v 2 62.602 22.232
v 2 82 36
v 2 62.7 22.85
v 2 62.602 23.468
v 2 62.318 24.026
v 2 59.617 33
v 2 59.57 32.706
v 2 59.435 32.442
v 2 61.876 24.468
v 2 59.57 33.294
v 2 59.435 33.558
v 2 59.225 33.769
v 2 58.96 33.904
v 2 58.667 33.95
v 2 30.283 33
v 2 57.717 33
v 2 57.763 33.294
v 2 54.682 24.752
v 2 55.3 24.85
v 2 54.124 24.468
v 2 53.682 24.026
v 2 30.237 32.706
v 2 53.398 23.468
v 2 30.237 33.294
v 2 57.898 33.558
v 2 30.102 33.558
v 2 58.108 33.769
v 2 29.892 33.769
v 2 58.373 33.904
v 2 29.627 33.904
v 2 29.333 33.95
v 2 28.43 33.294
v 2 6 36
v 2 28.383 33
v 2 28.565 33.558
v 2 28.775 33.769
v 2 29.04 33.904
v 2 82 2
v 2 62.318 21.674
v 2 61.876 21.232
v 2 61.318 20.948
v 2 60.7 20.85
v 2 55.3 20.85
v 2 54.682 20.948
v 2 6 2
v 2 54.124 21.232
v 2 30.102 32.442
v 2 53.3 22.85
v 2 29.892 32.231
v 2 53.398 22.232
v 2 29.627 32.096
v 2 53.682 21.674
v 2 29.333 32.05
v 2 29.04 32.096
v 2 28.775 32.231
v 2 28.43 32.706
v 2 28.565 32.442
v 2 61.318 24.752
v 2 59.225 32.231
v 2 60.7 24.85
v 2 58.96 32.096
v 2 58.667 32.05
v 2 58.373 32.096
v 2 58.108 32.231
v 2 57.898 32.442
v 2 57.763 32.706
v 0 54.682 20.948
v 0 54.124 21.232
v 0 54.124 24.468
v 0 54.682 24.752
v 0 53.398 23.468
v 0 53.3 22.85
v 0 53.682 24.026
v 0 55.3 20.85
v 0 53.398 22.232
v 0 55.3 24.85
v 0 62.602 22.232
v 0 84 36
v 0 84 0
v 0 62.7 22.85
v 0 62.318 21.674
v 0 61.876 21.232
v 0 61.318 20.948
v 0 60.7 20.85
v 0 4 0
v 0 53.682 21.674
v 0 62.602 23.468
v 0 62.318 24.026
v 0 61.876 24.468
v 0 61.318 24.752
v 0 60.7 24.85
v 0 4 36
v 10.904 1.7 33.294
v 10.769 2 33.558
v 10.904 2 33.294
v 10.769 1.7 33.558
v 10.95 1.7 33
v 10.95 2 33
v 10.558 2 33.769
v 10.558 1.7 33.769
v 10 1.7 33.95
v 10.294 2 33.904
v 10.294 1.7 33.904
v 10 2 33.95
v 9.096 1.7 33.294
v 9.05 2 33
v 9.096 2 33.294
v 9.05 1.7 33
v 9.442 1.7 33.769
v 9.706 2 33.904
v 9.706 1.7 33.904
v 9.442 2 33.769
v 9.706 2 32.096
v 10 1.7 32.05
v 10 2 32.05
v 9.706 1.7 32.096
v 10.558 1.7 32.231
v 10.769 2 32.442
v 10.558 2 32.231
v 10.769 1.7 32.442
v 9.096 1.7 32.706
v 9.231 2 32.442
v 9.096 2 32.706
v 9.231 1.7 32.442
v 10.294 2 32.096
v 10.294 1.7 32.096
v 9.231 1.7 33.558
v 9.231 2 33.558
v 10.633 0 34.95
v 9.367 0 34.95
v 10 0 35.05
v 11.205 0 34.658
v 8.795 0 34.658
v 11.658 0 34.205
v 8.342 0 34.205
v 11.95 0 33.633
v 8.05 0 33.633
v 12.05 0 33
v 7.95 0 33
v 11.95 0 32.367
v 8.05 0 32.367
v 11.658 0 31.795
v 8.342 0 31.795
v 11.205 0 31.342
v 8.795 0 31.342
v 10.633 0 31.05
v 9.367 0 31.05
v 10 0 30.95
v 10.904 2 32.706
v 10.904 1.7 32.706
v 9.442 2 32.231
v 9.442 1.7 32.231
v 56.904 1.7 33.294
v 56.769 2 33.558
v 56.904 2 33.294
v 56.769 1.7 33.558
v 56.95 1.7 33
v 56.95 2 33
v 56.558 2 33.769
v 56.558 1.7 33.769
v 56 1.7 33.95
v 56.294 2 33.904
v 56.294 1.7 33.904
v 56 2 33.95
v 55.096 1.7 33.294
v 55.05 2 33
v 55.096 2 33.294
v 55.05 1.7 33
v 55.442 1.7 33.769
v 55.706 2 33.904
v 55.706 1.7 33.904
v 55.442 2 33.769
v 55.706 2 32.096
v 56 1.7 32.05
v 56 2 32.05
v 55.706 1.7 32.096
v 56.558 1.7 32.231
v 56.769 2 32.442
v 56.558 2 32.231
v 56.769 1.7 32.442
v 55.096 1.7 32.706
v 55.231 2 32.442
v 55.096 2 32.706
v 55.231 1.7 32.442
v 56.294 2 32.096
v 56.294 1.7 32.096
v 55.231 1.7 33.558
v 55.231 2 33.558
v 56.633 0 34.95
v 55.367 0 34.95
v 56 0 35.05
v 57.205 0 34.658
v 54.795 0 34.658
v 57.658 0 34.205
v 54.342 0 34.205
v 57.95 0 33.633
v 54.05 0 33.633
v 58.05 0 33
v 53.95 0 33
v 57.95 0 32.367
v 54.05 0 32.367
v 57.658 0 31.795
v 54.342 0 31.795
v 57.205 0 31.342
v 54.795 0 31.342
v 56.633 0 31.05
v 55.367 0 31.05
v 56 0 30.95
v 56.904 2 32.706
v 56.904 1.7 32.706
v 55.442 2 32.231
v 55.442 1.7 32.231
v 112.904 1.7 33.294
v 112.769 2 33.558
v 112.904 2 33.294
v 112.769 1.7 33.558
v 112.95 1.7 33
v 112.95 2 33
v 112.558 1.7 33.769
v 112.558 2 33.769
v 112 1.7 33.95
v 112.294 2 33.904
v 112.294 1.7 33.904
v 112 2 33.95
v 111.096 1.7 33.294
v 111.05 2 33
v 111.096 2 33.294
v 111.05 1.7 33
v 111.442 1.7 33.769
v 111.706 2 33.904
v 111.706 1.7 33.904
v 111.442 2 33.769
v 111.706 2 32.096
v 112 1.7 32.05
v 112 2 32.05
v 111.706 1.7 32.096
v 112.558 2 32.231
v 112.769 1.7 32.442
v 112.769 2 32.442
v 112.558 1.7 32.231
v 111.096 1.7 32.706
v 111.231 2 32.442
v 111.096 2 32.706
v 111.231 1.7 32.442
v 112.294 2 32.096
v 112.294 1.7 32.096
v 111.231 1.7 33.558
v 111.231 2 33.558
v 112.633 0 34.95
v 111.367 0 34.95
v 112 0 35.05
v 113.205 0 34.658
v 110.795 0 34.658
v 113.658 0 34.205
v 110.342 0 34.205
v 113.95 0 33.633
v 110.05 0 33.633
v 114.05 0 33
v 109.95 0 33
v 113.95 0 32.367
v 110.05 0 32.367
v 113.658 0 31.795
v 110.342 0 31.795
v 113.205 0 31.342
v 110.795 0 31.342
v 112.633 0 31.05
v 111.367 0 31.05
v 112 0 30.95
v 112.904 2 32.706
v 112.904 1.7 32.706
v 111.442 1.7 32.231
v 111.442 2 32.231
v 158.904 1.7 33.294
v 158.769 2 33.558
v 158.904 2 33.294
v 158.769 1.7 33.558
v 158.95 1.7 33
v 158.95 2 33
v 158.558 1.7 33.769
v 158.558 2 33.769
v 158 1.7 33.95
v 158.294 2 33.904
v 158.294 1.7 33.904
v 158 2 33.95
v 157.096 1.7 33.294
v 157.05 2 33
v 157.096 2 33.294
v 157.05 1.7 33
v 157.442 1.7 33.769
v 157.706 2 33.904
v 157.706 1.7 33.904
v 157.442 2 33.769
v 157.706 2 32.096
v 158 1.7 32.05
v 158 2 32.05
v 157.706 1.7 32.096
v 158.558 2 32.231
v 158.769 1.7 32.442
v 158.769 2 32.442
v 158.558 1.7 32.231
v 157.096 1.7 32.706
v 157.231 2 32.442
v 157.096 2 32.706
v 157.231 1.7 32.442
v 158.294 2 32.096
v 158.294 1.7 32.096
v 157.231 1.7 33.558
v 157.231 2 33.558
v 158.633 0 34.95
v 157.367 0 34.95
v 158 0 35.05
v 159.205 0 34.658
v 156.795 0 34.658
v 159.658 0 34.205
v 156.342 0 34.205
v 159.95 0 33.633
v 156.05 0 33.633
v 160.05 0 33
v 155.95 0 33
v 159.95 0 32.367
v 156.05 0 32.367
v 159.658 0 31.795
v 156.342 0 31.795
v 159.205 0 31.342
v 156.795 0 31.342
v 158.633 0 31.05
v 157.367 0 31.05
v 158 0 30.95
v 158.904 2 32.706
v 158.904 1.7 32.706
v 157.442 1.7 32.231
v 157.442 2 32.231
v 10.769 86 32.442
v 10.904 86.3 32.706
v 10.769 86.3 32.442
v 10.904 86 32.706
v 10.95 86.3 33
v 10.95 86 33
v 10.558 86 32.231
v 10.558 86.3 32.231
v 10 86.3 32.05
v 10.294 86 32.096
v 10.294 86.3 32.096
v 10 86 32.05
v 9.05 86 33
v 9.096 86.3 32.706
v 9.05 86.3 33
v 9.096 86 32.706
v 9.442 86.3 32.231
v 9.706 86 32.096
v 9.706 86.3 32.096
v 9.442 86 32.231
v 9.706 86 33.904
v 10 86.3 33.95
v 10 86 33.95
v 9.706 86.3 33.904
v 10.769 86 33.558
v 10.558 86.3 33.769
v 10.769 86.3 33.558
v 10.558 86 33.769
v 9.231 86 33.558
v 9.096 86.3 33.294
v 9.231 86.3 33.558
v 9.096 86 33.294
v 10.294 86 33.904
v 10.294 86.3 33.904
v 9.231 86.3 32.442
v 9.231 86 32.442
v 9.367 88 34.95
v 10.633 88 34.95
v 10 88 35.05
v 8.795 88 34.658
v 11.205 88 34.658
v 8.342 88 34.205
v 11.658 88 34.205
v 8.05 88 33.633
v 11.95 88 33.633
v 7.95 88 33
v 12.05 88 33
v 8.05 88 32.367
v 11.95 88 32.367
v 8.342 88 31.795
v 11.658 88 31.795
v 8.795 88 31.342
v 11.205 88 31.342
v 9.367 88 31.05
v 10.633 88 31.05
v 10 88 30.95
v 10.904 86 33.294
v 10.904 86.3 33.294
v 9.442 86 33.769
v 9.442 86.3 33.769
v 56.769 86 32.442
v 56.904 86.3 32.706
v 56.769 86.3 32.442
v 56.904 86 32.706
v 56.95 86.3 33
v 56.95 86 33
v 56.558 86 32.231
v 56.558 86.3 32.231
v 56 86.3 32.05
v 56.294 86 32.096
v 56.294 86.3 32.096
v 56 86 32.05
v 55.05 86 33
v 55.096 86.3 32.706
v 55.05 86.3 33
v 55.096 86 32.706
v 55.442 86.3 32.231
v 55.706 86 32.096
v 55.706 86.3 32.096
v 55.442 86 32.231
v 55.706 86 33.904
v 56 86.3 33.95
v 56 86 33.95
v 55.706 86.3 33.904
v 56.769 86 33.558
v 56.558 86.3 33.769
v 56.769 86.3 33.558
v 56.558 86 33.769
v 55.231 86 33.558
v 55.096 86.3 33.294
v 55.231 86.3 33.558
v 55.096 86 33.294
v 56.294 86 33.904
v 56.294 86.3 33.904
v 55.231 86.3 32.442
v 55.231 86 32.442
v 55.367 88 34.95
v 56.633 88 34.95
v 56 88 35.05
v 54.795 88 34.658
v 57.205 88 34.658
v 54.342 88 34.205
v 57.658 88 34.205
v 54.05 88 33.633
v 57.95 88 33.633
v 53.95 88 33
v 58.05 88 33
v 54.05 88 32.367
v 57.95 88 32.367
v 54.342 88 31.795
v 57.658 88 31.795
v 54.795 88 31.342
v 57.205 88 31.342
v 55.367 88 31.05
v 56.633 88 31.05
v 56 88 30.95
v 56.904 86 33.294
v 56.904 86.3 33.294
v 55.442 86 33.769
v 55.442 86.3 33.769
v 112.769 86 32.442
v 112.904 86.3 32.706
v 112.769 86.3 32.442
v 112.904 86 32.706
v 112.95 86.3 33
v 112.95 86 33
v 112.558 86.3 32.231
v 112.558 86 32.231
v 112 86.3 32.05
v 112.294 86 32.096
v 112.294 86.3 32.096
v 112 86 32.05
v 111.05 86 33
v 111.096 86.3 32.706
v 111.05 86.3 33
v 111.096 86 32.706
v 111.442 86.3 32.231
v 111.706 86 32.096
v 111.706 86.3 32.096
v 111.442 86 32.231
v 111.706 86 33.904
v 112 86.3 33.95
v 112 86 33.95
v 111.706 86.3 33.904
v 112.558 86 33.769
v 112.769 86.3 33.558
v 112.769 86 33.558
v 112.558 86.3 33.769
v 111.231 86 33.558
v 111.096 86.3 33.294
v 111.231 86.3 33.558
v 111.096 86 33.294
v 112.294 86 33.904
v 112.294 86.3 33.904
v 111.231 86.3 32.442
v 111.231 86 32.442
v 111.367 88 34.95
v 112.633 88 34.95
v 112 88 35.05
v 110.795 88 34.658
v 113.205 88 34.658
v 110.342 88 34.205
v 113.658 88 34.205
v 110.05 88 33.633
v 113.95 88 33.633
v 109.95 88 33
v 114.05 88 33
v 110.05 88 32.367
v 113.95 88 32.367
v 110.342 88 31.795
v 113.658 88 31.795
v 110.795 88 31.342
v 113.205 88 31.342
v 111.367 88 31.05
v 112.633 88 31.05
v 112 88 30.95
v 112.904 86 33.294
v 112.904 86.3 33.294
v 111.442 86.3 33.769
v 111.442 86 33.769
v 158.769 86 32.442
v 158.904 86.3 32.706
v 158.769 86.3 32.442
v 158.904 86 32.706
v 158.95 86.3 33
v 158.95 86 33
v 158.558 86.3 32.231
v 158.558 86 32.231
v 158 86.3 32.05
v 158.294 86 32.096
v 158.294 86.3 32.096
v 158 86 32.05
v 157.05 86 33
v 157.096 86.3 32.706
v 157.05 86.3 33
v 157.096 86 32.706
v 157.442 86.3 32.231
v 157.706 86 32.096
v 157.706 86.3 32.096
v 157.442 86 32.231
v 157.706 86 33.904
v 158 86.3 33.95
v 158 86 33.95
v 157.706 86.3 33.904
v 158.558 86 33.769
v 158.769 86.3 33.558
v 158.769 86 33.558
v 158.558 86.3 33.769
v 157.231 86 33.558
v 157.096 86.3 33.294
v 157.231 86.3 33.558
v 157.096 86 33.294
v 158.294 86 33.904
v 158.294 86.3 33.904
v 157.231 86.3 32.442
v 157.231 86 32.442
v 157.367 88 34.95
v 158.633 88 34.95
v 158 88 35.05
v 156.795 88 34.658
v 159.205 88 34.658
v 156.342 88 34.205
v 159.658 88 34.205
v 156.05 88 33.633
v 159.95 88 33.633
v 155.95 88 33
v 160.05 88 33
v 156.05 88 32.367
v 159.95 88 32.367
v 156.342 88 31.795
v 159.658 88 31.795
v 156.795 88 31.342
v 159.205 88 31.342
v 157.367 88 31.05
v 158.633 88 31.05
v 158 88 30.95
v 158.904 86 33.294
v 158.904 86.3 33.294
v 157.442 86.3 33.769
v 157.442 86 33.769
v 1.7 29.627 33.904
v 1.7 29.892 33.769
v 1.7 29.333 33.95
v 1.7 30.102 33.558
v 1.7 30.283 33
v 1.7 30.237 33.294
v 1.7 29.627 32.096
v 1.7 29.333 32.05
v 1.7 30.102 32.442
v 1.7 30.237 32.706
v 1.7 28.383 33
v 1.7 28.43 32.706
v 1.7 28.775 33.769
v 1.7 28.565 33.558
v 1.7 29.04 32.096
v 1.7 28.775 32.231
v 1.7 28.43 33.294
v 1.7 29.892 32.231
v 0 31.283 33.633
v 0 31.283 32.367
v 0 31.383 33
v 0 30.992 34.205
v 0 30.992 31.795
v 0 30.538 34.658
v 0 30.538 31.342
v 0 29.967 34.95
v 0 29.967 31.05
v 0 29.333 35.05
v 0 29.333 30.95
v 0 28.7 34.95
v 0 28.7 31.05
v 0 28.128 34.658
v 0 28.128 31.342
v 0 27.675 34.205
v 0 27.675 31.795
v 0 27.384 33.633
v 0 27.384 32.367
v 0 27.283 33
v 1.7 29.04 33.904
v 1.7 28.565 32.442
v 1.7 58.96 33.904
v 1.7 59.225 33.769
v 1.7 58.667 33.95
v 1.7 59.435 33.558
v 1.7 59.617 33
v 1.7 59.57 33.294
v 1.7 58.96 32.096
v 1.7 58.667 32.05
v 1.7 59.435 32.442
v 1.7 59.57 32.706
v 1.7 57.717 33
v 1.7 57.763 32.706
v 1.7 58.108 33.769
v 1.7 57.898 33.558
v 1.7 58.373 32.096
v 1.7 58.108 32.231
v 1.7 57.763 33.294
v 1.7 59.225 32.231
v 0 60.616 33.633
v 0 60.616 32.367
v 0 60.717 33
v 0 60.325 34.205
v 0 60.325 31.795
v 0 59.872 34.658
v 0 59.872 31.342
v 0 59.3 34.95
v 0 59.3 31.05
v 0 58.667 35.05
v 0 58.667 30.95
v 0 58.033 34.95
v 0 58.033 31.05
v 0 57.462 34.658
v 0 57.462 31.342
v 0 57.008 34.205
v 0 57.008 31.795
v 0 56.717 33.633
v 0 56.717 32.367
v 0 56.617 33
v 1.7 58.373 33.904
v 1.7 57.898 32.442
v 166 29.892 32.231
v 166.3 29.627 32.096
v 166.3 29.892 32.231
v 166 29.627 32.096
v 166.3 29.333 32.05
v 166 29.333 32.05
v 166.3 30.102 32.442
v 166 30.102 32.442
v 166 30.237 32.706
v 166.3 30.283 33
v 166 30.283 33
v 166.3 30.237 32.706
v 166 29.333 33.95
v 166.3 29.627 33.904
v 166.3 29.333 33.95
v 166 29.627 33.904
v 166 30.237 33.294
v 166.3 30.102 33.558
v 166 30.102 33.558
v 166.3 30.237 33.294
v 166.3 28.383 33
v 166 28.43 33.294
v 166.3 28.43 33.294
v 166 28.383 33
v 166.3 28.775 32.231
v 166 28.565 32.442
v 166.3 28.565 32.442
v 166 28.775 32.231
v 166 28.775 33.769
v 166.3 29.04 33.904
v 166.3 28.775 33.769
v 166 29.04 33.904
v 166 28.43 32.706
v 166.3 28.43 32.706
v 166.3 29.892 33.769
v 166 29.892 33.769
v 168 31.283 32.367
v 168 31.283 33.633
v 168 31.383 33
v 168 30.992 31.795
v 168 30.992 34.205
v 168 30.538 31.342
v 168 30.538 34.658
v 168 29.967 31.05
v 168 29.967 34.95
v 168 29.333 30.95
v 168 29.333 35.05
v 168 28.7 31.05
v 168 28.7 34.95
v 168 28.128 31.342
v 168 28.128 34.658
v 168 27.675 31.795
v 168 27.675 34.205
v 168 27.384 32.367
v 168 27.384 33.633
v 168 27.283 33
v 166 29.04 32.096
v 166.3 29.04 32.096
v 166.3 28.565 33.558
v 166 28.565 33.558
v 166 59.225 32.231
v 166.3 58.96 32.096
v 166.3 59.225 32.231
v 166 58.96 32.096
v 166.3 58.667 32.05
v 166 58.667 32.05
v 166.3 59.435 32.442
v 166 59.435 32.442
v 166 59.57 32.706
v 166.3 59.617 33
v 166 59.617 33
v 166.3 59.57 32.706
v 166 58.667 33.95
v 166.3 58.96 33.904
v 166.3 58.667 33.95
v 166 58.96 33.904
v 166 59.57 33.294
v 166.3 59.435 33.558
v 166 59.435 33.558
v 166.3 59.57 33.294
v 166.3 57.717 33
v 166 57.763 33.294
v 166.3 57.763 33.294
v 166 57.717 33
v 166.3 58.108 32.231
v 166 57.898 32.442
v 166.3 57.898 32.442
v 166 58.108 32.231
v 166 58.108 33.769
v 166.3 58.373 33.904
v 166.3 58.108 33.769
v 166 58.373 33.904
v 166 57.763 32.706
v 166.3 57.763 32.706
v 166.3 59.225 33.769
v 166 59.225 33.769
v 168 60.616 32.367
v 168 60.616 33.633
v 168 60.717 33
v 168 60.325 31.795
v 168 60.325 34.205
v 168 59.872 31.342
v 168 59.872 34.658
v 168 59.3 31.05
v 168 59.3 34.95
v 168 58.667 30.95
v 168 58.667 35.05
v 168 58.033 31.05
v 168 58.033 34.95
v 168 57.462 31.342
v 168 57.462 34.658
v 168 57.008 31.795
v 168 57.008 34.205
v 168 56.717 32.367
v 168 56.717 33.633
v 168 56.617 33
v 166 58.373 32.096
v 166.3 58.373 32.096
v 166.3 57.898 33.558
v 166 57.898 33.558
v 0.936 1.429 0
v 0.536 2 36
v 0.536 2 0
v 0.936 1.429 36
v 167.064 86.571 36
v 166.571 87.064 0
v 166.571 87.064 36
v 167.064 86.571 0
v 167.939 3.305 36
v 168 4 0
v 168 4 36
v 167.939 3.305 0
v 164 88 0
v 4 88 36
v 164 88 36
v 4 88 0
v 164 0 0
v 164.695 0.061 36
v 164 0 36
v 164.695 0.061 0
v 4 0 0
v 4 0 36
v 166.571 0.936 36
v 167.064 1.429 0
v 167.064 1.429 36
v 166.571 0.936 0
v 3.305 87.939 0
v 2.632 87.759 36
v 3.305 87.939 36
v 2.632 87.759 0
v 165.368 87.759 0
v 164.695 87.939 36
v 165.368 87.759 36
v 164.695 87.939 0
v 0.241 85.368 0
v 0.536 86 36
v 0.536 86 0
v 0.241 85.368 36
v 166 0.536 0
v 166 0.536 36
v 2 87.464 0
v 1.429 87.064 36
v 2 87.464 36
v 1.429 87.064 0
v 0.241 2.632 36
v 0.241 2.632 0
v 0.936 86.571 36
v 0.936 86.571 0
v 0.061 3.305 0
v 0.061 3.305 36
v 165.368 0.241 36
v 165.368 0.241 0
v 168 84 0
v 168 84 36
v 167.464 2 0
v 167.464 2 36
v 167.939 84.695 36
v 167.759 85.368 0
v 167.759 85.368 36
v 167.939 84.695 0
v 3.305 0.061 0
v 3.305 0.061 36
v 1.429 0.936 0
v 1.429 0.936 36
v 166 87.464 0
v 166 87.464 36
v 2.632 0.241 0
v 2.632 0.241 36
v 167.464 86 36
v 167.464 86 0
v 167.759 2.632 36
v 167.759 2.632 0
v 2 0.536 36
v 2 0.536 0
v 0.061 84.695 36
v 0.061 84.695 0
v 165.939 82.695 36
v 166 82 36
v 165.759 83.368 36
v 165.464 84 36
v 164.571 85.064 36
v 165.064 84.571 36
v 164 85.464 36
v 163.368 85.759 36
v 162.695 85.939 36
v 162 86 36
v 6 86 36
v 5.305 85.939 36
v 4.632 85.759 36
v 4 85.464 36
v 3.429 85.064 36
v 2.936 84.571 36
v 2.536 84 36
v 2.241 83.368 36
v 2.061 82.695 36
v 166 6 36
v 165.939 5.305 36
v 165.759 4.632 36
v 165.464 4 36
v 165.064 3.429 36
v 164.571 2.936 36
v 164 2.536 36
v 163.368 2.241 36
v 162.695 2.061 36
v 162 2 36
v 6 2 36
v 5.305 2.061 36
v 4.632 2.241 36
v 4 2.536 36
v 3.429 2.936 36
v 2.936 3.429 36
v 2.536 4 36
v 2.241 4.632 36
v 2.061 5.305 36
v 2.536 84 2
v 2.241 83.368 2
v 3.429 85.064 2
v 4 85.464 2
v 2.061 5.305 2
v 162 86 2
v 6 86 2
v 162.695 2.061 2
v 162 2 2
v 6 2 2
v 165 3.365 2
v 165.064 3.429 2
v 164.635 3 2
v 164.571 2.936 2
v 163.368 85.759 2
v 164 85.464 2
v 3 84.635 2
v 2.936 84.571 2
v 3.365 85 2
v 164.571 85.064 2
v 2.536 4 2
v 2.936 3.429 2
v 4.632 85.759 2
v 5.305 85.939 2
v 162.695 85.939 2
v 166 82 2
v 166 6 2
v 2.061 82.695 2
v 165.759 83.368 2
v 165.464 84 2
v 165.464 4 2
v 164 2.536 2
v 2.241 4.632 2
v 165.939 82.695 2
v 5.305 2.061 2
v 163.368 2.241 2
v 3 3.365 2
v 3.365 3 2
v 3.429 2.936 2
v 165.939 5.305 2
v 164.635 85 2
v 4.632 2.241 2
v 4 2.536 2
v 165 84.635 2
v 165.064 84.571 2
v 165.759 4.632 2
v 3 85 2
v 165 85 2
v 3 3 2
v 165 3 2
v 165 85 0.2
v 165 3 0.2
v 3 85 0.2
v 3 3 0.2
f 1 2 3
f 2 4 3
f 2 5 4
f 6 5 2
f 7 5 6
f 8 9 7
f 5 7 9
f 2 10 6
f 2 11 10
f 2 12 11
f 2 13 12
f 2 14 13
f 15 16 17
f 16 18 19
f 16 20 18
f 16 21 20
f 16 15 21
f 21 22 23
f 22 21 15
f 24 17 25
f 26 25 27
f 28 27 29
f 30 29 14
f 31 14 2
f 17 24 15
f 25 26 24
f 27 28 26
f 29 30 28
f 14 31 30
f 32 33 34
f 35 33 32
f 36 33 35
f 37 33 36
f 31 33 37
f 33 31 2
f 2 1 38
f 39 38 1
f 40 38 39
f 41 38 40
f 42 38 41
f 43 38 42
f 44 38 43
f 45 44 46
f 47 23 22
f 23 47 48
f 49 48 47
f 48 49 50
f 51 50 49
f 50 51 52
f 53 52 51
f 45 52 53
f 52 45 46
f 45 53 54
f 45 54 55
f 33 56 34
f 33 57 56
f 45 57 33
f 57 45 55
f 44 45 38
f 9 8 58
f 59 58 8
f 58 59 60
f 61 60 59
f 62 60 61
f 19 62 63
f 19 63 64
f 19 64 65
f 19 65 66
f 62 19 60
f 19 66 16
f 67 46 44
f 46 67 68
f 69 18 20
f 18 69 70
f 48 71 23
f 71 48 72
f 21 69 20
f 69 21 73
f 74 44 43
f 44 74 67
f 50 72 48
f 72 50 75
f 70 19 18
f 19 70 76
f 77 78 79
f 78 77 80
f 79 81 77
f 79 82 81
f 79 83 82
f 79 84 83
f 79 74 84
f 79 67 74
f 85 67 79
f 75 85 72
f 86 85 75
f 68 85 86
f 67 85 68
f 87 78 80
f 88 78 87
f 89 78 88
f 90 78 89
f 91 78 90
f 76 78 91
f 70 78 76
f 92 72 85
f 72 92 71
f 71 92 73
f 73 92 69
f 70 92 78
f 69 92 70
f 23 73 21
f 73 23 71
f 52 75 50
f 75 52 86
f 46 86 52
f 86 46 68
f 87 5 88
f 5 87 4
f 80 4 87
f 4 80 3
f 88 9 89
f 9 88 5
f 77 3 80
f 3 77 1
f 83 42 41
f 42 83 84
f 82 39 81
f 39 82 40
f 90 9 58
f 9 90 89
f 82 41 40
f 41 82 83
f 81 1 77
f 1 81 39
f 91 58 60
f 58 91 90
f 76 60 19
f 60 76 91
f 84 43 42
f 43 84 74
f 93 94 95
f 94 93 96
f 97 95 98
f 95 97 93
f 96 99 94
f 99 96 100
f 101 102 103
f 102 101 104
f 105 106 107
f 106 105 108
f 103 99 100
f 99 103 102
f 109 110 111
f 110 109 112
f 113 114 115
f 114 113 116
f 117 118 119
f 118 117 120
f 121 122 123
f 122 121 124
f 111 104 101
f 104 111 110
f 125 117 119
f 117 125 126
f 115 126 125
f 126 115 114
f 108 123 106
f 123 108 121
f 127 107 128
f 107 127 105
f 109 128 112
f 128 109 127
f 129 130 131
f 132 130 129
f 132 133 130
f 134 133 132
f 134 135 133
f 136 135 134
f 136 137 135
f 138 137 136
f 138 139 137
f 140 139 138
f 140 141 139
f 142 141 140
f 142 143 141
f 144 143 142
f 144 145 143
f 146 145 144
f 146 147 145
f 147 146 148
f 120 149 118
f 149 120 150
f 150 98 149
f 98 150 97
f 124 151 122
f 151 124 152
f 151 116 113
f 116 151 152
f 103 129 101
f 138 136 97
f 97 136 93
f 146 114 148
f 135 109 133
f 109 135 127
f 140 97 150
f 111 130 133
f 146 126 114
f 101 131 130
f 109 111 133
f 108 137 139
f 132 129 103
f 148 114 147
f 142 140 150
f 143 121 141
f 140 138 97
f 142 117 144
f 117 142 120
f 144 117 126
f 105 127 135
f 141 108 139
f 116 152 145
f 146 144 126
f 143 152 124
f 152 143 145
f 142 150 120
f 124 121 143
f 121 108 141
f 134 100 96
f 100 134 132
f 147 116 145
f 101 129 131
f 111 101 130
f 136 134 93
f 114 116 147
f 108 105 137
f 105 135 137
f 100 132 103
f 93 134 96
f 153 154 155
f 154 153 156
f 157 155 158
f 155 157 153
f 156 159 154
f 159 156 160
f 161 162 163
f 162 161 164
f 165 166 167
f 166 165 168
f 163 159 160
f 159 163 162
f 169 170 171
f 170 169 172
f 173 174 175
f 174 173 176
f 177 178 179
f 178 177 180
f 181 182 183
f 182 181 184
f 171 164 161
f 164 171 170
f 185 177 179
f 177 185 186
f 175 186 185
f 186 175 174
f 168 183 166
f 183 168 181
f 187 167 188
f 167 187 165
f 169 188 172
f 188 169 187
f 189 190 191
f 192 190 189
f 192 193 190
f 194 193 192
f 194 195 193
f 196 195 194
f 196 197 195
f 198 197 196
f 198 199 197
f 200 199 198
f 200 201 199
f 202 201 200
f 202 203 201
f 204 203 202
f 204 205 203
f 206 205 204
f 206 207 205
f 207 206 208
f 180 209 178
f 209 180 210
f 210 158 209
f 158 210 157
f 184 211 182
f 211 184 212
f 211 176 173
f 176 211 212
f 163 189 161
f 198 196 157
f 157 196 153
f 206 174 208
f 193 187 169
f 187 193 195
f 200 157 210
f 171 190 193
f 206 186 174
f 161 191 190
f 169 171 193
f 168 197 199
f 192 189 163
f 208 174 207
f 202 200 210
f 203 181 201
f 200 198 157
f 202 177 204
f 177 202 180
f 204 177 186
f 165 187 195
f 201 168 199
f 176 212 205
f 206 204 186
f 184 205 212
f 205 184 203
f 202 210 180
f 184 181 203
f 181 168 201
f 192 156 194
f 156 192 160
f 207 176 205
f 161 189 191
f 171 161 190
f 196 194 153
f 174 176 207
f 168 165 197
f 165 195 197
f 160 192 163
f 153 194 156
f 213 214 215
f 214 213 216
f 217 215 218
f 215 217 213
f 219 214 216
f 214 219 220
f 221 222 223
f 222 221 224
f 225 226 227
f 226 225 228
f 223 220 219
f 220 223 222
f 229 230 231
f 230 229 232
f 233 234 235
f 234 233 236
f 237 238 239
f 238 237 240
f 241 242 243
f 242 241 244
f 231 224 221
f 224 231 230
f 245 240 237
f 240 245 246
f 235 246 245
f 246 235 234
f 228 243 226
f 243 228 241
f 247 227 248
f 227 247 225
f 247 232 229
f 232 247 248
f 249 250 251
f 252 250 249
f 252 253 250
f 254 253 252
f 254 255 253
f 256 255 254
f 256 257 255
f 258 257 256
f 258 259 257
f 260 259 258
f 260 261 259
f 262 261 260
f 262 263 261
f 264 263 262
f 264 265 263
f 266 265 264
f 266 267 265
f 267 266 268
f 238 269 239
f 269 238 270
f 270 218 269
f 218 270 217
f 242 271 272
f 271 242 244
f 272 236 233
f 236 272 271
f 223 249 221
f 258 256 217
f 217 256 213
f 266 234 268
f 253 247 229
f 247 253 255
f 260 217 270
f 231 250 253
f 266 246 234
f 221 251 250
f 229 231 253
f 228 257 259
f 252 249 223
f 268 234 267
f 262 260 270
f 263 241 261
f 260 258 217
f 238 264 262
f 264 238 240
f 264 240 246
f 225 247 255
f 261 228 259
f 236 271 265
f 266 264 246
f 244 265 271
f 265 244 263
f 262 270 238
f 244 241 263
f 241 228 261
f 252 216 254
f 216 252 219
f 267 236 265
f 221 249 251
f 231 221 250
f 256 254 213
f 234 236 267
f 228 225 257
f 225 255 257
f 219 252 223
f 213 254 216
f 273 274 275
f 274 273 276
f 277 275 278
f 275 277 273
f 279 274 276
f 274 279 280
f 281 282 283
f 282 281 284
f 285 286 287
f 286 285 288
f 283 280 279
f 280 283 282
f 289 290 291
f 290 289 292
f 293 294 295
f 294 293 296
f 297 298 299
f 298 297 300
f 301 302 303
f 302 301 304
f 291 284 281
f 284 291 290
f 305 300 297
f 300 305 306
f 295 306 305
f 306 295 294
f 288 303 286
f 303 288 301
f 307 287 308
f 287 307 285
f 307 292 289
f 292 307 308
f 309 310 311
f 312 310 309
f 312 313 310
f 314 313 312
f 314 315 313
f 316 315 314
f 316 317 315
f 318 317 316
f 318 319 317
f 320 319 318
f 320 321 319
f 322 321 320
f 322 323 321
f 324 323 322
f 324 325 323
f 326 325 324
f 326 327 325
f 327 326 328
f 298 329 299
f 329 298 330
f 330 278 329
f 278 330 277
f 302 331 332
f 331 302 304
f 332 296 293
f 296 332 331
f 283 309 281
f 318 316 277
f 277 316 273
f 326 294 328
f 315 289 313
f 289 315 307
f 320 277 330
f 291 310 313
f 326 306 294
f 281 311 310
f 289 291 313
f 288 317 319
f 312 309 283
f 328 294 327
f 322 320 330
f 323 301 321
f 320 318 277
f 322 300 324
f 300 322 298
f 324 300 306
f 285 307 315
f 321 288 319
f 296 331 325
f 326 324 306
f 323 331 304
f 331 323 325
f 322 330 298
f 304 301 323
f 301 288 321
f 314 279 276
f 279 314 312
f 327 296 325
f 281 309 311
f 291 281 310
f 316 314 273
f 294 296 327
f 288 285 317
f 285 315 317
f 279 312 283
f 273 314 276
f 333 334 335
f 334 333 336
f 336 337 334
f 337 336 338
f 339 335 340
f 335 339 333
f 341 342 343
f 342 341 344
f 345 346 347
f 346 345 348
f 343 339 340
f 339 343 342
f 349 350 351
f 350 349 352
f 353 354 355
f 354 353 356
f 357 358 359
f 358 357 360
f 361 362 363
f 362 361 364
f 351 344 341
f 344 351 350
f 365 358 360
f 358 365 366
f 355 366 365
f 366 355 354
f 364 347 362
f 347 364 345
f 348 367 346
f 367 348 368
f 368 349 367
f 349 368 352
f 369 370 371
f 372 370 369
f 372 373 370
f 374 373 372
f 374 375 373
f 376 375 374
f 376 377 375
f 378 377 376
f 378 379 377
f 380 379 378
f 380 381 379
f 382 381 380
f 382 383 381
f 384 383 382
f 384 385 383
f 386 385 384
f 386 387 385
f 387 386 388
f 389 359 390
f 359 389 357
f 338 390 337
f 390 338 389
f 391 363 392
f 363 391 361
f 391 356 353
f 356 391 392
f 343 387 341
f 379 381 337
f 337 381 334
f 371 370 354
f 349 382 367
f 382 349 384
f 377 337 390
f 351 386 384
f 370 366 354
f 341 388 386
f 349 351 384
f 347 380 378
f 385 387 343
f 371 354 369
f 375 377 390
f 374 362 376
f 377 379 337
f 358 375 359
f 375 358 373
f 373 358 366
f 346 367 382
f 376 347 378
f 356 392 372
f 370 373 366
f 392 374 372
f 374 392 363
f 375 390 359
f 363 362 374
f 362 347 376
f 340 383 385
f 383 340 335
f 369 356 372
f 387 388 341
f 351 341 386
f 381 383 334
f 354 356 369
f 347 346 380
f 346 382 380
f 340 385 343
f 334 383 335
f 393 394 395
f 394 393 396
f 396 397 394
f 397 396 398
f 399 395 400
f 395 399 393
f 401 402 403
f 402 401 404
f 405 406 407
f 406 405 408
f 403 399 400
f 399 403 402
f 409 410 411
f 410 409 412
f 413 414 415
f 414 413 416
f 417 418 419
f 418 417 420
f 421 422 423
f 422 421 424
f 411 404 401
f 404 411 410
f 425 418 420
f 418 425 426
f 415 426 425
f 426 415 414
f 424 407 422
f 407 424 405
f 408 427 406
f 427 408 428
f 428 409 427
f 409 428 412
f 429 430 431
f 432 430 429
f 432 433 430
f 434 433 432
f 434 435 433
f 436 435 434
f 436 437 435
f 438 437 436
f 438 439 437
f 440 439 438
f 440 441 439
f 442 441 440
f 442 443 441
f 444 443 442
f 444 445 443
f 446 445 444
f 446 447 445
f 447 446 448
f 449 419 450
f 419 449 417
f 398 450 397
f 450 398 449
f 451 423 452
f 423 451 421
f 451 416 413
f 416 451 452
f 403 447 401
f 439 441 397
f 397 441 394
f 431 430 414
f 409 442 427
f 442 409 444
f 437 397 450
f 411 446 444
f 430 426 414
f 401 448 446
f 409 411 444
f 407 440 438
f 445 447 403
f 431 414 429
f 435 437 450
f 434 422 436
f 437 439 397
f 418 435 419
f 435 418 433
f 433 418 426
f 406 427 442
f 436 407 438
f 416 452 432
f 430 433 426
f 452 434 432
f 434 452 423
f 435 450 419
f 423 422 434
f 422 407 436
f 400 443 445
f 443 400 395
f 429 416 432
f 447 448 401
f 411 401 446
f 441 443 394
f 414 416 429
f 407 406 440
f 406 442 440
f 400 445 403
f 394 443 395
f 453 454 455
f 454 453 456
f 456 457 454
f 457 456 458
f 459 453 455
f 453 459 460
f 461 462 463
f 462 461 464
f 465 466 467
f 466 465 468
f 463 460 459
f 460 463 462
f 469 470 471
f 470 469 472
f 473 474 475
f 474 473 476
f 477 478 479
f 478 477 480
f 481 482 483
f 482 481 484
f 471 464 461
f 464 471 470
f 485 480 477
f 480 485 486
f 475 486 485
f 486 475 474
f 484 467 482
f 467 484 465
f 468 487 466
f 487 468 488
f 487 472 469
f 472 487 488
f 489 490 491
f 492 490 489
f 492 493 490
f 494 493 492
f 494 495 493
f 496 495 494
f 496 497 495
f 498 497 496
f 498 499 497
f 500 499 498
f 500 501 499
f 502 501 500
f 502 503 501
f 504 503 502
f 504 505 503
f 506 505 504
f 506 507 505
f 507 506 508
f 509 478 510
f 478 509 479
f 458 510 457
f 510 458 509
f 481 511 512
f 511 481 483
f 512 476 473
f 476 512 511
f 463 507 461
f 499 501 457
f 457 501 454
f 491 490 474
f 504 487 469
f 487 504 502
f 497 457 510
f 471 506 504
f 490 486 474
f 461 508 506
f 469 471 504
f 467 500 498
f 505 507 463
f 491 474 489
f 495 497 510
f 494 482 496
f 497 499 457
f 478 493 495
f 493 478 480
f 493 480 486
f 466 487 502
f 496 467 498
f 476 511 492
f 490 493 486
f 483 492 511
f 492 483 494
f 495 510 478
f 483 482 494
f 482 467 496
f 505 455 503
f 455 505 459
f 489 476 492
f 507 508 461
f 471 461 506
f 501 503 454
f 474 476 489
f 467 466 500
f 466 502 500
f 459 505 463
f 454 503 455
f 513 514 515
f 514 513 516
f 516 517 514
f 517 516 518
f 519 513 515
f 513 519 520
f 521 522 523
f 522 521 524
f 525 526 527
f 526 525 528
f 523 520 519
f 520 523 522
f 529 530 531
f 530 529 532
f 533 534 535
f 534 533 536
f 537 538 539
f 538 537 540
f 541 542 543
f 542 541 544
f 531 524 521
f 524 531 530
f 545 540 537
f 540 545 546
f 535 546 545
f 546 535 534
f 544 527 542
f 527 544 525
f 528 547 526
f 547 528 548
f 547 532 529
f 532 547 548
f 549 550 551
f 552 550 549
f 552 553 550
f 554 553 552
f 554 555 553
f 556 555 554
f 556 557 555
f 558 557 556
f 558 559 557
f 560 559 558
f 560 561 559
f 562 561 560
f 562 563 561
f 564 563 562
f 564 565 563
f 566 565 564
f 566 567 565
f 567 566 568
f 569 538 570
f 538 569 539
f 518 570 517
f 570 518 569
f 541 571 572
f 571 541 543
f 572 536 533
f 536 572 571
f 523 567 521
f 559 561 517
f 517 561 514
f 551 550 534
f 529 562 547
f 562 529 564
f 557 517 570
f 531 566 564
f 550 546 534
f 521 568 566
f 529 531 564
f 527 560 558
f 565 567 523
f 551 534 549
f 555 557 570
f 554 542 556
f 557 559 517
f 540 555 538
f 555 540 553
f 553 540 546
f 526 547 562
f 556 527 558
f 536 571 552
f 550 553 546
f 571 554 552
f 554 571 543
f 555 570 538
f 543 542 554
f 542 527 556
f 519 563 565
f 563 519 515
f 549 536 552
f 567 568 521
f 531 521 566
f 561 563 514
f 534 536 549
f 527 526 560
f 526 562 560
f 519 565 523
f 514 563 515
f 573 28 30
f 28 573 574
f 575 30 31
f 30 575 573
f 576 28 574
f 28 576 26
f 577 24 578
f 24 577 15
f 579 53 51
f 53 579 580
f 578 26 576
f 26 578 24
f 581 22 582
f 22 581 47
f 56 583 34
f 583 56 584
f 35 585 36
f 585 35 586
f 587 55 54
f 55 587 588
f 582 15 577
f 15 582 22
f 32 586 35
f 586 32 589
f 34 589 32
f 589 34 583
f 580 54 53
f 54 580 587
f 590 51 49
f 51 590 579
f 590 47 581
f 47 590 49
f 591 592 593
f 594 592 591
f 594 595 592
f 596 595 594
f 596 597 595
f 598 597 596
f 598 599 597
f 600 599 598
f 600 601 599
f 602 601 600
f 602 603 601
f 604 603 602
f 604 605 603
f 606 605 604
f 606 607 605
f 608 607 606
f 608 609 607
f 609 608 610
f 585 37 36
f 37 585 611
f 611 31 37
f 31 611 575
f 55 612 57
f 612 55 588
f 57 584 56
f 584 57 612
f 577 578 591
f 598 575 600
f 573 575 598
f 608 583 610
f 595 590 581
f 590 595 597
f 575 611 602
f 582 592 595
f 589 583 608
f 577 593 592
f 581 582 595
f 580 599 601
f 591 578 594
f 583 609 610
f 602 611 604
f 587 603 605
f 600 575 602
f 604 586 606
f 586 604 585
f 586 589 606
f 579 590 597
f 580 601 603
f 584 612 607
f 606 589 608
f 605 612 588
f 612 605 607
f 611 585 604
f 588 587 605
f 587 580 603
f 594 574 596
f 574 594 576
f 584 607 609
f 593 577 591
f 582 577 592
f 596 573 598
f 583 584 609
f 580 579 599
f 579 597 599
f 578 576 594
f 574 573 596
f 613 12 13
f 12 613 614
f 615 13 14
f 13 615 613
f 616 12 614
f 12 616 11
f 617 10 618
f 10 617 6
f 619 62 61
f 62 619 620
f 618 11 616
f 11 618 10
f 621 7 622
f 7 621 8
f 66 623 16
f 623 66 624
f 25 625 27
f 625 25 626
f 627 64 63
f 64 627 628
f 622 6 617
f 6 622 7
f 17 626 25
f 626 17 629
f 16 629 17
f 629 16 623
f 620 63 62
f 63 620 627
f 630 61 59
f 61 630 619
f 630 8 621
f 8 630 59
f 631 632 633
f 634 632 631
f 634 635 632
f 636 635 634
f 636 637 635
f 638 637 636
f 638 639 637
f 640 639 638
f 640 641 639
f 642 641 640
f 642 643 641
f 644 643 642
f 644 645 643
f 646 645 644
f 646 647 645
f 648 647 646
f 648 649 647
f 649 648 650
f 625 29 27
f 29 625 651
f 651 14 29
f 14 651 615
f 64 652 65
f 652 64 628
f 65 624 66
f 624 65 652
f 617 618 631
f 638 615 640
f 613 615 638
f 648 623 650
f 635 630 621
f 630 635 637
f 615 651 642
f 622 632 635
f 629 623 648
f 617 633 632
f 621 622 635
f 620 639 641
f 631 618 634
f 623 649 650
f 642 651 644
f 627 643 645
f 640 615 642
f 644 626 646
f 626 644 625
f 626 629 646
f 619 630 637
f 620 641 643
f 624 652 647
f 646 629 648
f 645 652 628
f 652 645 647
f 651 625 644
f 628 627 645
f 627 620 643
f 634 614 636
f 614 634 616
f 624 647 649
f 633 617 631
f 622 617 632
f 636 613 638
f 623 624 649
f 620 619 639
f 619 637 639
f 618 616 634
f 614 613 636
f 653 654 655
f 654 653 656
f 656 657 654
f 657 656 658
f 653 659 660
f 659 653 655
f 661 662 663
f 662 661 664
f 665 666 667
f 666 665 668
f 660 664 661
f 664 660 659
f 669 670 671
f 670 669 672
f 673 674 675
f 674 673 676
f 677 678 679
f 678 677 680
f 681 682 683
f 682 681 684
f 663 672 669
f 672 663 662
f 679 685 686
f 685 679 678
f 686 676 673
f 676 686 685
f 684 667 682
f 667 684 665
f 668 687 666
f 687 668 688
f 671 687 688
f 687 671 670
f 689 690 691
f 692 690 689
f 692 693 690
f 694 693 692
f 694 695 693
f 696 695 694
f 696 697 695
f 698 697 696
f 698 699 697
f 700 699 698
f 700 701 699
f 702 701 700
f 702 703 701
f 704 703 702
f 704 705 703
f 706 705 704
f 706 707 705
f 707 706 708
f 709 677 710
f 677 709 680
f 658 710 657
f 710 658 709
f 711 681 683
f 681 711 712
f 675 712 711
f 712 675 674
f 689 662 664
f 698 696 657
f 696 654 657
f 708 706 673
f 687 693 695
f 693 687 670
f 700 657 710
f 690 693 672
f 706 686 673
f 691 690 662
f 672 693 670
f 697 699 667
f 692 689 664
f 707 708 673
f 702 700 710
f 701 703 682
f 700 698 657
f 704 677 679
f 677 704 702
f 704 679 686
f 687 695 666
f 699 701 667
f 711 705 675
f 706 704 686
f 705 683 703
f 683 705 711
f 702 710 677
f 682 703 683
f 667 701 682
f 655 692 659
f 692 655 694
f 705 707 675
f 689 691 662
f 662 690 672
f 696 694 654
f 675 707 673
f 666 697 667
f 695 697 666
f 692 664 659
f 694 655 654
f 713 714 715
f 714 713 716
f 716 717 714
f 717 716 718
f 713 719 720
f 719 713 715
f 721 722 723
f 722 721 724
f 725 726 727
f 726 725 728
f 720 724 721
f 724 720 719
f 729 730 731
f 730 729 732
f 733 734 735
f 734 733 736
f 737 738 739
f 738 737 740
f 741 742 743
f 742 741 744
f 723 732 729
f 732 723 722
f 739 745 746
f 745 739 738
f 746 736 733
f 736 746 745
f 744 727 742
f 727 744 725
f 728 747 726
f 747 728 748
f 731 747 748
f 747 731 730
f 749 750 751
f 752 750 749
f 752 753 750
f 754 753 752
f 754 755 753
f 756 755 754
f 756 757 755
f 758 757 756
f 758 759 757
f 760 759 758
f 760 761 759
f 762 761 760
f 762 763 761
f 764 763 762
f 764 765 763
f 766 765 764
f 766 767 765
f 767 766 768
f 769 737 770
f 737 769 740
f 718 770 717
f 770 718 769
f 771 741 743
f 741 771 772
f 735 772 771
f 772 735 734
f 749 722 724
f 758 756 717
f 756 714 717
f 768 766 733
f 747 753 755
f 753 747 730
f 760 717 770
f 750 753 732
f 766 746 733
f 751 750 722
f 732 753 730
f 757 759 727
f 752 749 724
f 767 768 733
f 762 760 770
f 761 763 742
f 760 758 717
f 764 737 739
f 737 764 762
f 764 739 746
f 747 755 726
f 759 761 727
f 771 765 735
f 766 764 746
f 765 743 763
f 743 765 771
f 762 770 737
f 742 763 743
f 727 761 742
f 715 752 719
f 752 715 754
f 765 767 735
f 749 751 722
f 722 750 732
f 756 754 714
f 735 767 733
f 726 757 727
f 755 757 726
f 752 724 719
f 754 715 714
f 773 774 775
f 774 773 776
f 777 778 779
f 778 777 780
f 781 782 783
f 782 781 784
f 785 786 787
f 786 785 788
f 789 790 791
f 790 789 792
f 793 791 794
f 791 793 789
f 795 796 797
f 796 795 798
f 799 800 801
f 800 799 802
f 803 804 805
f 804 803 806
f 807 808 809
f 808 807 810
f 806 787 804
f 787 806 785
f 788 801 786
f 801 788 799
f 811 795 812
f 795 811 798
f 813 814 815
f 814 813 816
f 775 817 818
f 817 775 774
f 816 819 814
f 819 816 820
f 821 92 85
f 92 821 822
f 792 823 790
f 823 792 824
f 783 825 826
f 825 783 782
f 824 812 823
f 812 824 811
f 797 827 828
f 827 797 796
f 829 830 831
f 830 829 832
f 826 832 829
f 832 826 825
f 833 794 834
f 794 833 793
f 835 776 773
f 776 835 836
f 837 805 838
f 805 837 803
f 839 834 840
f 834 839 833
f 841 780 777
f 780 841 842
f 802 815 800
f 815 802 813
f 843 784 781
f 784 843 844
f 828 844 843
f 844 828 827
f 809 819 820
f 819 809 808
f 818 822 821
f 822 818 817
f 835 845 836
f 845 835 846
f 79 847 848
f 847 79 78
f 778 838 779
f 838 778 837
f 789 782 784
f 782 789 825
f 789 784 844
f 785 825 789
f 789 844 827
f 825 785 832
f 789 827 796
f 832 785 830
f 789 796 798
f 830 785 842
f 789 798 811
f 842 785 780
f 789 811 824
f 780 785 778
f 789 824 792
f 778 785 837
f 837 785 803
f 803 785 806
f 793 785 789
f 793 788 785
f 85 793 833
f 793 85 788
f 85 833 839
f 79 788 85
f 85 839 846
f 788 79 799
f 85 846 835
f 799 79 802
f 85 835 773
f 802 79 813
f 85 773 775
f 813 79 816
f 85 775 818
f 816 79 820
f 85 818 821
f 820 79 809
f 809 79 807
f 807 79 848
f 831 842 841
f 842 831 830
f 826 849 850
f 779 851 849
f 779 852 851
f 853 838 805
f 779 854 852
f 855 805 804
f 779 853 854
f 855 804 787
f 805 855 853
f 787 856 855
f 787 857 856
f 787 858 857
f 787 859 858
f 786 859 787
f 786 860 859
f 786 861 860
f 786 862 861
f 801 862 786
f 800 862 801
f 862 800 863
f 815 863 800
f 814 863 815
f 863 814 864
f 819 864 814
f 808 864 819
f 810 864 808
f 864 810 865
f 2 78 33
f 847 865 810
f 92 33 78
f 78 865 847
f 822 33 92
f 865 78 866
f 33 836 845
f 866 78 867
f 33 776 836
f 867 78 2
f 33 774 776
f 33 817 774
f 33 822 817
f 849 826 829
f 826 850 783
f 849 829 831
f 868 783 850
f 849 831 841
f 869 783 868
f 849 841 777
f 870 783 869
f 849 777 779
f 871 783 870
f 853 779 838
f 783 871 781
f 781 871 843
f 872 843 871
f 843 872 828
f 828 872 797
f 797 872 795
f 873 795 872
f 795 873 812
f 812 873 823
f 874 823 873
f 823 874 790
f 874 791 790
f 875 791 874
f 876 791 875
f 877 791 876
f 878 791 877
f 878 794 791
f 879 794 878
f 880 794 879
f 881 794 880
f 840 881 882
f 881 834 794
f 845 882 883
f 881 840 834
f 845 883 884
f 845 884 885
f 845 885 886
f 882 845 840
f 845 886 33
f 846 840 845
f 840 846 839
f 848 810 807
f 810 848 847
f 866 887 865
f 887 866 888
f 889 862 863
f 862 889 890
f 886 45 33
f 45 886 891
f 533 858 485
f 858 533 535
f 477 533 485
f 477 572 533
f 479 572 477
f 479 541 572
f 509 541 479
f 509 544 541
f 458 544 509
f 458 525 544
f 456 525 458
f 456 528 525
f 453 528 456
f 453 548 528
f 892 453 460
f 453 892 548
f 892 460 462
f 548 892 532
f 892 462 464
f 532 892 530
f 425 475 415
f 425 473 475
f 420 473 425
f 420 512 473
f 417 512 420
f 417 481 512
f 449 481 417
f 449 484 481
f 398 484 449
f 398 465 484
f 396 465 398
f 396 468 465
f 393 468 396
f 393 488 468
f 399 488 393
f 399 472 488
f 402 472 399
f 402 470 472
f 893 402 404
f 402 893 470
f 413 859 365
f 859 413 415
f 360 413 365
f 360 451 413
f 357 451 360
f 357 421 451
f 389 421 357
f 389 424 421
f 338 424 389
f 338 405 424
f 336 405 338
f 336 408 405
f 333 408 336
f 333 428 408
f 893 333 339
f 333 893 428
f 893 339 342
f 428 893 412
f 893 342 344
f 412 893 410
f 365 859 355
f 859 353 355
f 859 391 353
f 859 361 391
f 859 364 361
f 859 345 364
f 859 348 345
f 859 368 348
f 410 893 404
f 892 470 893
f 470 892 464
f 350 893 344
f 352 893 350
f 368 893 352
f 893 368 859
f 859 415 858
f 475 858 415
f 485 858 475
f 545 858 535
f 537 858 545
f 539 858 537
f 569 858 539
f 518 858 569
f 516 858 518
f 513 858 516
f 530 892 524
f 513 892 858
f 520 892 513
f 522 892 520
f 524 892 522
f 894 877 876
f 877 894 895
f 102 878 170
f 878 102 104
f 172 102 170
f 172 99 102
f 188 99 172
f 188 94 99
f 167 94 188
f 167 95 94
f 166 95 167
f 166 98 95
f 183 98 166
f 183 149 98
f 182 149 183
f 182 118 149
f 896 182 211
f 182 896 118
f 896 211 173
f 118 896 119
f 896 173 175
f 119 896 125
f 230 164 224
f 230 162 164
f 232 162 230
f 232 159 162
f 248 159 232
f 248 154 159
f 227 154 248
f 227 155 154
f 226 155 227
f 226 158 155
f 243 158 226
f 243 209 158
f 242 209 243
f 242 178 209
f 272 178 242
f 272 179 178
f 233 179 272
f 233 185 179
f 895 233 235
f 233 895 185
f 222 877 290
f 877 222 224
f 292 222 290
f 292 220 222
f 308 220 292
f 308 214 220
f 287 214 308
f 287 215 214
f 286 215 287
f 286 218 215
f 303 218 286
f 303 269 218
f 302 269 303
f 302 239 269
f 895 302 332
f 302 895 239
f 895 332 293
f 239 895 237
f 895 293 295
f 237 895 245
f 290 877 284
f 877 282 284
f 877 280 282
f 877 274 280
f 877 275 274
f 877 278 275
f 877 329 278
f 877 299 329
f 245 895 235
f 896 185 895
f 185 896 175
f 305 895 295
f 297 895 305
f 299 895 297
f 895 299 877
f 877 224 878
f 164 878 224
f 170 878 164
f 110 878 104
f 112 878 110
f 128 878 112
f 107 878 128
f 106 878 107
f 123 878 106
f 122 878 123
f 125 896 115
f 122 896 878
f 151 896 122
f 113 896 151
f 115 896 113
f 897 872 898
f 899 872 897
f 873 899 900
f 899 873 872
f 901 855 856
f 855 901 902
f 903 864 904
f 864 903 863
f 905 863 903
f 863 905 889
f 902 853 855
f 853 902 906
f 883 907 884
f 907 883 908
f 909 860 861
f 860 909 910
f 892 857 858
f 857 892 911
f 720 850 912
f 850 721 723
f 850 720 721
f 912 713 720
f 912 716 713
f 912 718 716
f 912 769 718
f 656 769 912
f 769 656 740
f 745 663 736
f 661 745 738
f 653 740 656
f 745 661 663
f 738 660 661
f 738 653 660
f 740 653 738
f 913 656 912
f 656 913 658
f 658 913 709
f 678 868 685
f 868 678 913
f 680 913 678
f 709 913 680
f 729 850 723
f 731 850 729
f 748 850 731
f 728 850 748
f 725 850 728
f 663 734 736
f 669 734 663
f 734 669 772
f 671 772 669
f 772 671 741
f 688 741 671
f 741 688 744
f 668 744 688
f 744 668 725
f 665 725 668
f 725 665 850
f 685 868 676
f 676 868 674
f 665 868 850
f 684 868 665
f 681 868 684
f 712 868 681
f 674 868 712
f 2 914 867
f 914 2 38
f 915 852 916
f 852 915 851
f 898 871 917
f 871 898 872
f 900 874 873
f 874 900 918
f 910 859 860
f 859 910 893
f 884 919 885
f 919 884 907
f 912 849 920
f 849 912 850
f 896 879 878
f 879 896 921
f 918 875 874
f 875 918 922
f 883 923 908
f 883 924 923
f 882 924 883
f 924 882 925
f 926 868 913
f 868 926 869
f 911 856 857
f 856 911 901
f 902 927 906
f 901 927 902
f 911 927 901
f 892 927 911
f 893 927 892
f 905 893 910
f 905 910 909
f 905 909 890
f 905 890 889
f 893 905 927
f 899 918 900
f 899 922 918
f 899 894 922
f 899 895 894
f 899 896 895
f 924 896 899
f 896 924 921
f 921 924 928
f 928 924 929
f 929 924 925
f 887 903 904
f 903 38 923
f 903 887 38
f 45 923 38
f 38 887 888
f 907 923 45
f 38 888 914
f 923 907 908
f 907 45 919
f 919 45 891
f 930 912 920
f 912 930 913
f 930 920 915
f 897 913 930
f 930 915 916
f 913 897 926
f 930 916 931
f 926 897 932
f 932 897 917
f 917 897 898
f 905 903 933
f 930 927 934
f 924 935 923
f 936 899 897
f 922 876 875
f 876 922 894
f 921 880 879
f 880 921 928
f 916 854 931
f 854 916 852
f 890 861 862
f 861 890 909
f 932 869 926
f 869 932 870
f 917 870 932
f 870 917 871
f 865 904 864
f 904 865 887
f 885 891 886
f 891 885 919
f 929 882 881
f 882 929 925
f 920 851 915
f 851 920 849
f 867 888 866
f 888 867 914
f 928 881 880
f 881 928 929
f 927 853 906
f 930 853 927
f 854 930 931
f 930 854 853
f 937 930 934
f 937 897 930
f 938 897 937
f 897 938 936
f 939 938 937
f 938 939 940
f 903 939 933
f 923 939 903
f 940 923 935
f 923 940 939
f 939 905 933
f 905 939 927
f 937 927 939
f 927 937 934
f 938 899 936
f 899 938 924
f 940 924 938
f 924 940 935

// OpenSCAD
DISPLAY_WIDTH = 160;
DISPLAY_DEPTH = 80;
DISPLAY_HEIGHT = 15; // excluding the little nubbin thing

DISPLAY_STANDOFFS = [
	[16.7, 7.65],
	[66.7, 7.65],
	[143.3, 7.65],
	[16.7, 72.65],
	[93.3, 72.65],
	[143.3, 72.65]
];

BOARD_DEPTH = 44.45;
BOARD_X_INSET = 1.2;
BOARD_Z_OFFSET = 11;

HEIGHT = 36; // of the case, excludes the backplate

SURFACE = 2;

DIFFUSER_HEIGHT = 0.2;

RADIUS = 4;

DISPLAY_SPACING = RADIUS / 2;

USB_C_Y_OFFSET = 14;
USB_C_Z_OFFSET = -3.15;

RTC_STANDOFF_X_SPACING = 0.5 * 25.4;
RTC_STANDOFF_Y_SPACING = 0.8 * 25.4;
RTC_X_OFFSET = 90;
RTC_STANDOFF_HEIGHT = 5;

SCREW_HEIGHT = 6.3;
SCREW_HEAD_DIAMETER = 4.1;
SCREW_HEAD_HEIGHT = 1.7;
SCREW_SHAFT_DIAMETER = 1.9;

function total_width() = DISPLAY_WIDTH + DISPLAY_SPACING * 2 + SURFACE * 2;
function total_depth() = DISPLAY_DEPTH + DISPLAY_SPACING * 2 + SURFACE * 2;
function board_total_height() = DISPLAY_HEIGHT + BOARD_Z_OFFSET;

module display() {
	delta = DISPLAY_SPACING + SURFACE;
	
	translate([delta, delta, DIFFUSER_HEIGHT])
	import("5036 RGB Matrix.stl");
}

module board() {
	translate([SURFACE + BOARD_X_INSET, BOARD_DEPTH + total_depth() / 2 - BOARD_DEPTH / 2, board_total_height()])
	rotate([180, 0, 0])
	import("5778 Matrix Portal S3.stl");
}

module usb_c() {
	width = 9.4;
	depth = 4;

	translate([0, total_depth() / 2 + USB_C_Y_OFFSET, board_total_height() + USB_C_Z_OFFSET])
	rotate([90, 0, 90])
	union() {		
		for (x = [-1, 1]) {
			translate([(width / 2 - depth / 2) * x, 0, 0])
			cylinder(d = depth, h = SURFACE, $fn = 20);
		}
		
		translate([0, 0, SURFACE / 2])
		cube([width - depth, depth, SURFACE], center = true);
	}
}

module case() {
	render()
	difference() {
		hull() {
			for (x = [RADIUS, SURFACE * 2 + DISPLAY_SPACING * 2 + DISPLAY_WIDTH - RADIUS]) {
				for (y = [RADIUS, SURFACE * 2 + DISPLAY_SPACING * 2 + DISPLAY_DEPTH - RADIUS]) {
					translate([x, y, 0])
					cylinder(r = RADIUS, h = HEIGHT, $fn = 36);
				}
			}
		}
		
		hull() {
			for (x = [RADIUS + SURFACE, SURFACE + DISPLAY_SPACING * 2 + DISPLAY_WIDTH - RADIUS]) {
				for (y = [RADIUS + SURFACE, SURFACE + DISPLAY_SPACING * 2 + DISPLAY_DEPTH - RADIUS]) {
					translate([x, y, SURFACE])
					cylinder(r = RADIUS, h = HEIGHT - SURFACE, $fn = 36);
				}
			}
		}
		
		translate([SURFACE + DISPLAY_SPACING - 1, SURFACE + DISPLAY_SPACING - 1, DIFFUSER_HEIGHT])
		cube([DISPLAY_WIDTH + 2, DISPLAY_DEPTH + 2, SURFACE - DIFFUSER_HEIGHT]);
		
		usb_c();
		
		screws();
	}
}

module screw() {
	cylinder(d = SCREW_SHAFT_DIAMETER, h = SCREW_HEIGHT, $fn = 20);
	
	translate([0, 0, SCREW_HEIGHT - SCREW_HEAD_HEIGHT])
	cylinder(d2 = SCREW_HEAD_DIAMETER, d1 = SCREW_SHAFT_DIAMETER, h = SCREW_HEAD_HEIGHT, $fn = 20);
}

module screws() {
	locations = [
		[10, SCREW_HEIGHT, 90, 0],
		[total_width() / 3, SCREW_HEIGHT, 90, 0],
		[2 * (total_width() / 3), SCREW_HEIGHT, 90, 0],
		[total_width() - 10, SCREW_HEIGHT, 90, 0],
		[10, total_depth() - SCREW_HEIGHT, 270, 0],
		[total_width() / 3, total_depth() - SCREW_HEIGHT, 270, 0],
		[2 * (total_width() / 3), total_depth() - SCREW_HEIGHT, 270, 0],
		[total_width() - 10, total_depth() - SCREW_HEIGHT, 270, 0],
		[SCREW_HEIGHT, total_depth() / 3, 0, 270, 0],
		[SCREW_HEIGHT, 2 * (total_depth() / 3), 0, 270, 0],
		[total_width() - SCREW_HEIGHT, total_depth() / 3, 0, 90, 0],
		[total_width() - SCREW_HEIGHT, 2 * (total_depth() / 3), 0, 90, 0]
	];

	for (location = locations) {
		x = location[0];
		y = location[1];
		x_rotation = location[2];
		y_rotation = location[3];
		
		translate([x, y, HEIGHT - 3])
		rotate([x_rotation, y_rotation, 0])
		screw();
	}
}

module backplate() {
	translate([0, 0, HEIGHT])
	render()
	difference() {
		hull() {
			for (x = [RADIUS, SURFACE * 2 + DISPLAY_SPACING * 2 + DISPLAY_WIDTH - RADIUS]) {
				for (y = [RADIUS, SURFACE * 2 + DISPLAY_SPACING * 2 + DISPLAY_DEPTH - RADIUS]) {
					translate([x, y, 0])
					cylinder(r = RADIUS, h = SURFACE, $fn = 36);
				}
			}
		}
		
		// display standoffs
		for (standoff = DISPLAY_STANDOFFS) {
			x = standoff[0] + SURFACE + DISPLAY_SPACING;
			y = standoff[1] + SURFACE + DISPLAY_SPACING;
			
			/*translate([x, y, SURFACE / 2])
			cylinder(d = 6, h = SURFACE / 2, $fn = 36);*/
			
			translate([x, y, 0])
			cylinder(d = 3.2, h = SURFACE, $fn = 36);
		}
	}
	
	render()
	difference() {
		translate([0, 0, HEIGHT - 6])
		hull() {
			for (x = [RADIUS + SURFACE, SURFACE + DISPLAY_SPACING * 2 + DISPLAY_WIDTH - RADIUS]) {
				for (y = [RADIUS + SURFACE, SURFACE + DISPLAY_SPACING * 2 + DISPLAY_DEPTH - RADIUS]) {
					translate([x, y, 0])
					cylinder(r = RADIUS, h = 8, $fn = 36);
				}
			}
		}
		
		translate([0, 0, HEIGHT - 6])
		hull() {
			for (x = [RADIUS + SURFACE * 2, DISPLAY_SPACING * 2 + DISPLAY_WIDTH - RADIUS]) {
				for (y = [RADIUS + SURFACE * 2, DISPLAY_SPACING * 2 + DISPLAY_DEPTH - RADIUS]) {
					translate([x, y, 0])
					cylinder(r = RADIUS, h = 8, $fn = 36);
				}
			}
		}
		
		screws();
	}
	
	// board standoffs
	for (x = [10.85, 51.45]) {
		for (y = [30.65, 50.35]) {
			translate([x, y, board_total_height()])
			render()
			difference() {
				cylinder(d = 4, h = HEIGHT - board_total_height(), $fn = 36);
				cylinder(d = 2.4, h = HEIGHT - board_total_height(), $fn = 36);
			}
		}
	}
	
	// RTC standoffs
	for (x = [RTC_X_OFFSET, RTC_X_OFFSET + RTC_STANDOFF_X_SPACING]) {
		for (y = [total_depth() / 2 - RTC_STANDOFF_Y_SPACING / 2, total_depth() / 2 + RTC_STANDOFF_Y_SPACING / 2]) {
			translate([x, y, HEIGHT - RTC_STANDOFF_HEIGHT])
			render()
			difference() {
				cylinder(d = 4.5, h = RTC_STANDOFF_HEIGHT, $fn = 36);
				cylinder(d = 2.9, h = RTC_STANDOFF_HEIGHT, $fn = 36);
			}
		}
	}
	
	// display standoffs
	for (standoff = DISPLAY_STANDOFFS) {
		x = standoff[0] + SURFACE + DISPLAY_SPACING;
		y = standoff[1] + SURFACE + DISPLAY_SPACING;
		
		translate([x, y, DISPLAY_HEIGHT])
		render()
		difference() {
			cylinder(d = 6, h = HEIGHT - DISPLAY_HEIGHT, $fn = 36);
			cylinder(d = 3.3, h = HEIGHT - DISPLAY_HEIGHT, $fn = 36);
		}
	}
}

//color("red") screws();
case();
//backplate();
//display();
//board();
